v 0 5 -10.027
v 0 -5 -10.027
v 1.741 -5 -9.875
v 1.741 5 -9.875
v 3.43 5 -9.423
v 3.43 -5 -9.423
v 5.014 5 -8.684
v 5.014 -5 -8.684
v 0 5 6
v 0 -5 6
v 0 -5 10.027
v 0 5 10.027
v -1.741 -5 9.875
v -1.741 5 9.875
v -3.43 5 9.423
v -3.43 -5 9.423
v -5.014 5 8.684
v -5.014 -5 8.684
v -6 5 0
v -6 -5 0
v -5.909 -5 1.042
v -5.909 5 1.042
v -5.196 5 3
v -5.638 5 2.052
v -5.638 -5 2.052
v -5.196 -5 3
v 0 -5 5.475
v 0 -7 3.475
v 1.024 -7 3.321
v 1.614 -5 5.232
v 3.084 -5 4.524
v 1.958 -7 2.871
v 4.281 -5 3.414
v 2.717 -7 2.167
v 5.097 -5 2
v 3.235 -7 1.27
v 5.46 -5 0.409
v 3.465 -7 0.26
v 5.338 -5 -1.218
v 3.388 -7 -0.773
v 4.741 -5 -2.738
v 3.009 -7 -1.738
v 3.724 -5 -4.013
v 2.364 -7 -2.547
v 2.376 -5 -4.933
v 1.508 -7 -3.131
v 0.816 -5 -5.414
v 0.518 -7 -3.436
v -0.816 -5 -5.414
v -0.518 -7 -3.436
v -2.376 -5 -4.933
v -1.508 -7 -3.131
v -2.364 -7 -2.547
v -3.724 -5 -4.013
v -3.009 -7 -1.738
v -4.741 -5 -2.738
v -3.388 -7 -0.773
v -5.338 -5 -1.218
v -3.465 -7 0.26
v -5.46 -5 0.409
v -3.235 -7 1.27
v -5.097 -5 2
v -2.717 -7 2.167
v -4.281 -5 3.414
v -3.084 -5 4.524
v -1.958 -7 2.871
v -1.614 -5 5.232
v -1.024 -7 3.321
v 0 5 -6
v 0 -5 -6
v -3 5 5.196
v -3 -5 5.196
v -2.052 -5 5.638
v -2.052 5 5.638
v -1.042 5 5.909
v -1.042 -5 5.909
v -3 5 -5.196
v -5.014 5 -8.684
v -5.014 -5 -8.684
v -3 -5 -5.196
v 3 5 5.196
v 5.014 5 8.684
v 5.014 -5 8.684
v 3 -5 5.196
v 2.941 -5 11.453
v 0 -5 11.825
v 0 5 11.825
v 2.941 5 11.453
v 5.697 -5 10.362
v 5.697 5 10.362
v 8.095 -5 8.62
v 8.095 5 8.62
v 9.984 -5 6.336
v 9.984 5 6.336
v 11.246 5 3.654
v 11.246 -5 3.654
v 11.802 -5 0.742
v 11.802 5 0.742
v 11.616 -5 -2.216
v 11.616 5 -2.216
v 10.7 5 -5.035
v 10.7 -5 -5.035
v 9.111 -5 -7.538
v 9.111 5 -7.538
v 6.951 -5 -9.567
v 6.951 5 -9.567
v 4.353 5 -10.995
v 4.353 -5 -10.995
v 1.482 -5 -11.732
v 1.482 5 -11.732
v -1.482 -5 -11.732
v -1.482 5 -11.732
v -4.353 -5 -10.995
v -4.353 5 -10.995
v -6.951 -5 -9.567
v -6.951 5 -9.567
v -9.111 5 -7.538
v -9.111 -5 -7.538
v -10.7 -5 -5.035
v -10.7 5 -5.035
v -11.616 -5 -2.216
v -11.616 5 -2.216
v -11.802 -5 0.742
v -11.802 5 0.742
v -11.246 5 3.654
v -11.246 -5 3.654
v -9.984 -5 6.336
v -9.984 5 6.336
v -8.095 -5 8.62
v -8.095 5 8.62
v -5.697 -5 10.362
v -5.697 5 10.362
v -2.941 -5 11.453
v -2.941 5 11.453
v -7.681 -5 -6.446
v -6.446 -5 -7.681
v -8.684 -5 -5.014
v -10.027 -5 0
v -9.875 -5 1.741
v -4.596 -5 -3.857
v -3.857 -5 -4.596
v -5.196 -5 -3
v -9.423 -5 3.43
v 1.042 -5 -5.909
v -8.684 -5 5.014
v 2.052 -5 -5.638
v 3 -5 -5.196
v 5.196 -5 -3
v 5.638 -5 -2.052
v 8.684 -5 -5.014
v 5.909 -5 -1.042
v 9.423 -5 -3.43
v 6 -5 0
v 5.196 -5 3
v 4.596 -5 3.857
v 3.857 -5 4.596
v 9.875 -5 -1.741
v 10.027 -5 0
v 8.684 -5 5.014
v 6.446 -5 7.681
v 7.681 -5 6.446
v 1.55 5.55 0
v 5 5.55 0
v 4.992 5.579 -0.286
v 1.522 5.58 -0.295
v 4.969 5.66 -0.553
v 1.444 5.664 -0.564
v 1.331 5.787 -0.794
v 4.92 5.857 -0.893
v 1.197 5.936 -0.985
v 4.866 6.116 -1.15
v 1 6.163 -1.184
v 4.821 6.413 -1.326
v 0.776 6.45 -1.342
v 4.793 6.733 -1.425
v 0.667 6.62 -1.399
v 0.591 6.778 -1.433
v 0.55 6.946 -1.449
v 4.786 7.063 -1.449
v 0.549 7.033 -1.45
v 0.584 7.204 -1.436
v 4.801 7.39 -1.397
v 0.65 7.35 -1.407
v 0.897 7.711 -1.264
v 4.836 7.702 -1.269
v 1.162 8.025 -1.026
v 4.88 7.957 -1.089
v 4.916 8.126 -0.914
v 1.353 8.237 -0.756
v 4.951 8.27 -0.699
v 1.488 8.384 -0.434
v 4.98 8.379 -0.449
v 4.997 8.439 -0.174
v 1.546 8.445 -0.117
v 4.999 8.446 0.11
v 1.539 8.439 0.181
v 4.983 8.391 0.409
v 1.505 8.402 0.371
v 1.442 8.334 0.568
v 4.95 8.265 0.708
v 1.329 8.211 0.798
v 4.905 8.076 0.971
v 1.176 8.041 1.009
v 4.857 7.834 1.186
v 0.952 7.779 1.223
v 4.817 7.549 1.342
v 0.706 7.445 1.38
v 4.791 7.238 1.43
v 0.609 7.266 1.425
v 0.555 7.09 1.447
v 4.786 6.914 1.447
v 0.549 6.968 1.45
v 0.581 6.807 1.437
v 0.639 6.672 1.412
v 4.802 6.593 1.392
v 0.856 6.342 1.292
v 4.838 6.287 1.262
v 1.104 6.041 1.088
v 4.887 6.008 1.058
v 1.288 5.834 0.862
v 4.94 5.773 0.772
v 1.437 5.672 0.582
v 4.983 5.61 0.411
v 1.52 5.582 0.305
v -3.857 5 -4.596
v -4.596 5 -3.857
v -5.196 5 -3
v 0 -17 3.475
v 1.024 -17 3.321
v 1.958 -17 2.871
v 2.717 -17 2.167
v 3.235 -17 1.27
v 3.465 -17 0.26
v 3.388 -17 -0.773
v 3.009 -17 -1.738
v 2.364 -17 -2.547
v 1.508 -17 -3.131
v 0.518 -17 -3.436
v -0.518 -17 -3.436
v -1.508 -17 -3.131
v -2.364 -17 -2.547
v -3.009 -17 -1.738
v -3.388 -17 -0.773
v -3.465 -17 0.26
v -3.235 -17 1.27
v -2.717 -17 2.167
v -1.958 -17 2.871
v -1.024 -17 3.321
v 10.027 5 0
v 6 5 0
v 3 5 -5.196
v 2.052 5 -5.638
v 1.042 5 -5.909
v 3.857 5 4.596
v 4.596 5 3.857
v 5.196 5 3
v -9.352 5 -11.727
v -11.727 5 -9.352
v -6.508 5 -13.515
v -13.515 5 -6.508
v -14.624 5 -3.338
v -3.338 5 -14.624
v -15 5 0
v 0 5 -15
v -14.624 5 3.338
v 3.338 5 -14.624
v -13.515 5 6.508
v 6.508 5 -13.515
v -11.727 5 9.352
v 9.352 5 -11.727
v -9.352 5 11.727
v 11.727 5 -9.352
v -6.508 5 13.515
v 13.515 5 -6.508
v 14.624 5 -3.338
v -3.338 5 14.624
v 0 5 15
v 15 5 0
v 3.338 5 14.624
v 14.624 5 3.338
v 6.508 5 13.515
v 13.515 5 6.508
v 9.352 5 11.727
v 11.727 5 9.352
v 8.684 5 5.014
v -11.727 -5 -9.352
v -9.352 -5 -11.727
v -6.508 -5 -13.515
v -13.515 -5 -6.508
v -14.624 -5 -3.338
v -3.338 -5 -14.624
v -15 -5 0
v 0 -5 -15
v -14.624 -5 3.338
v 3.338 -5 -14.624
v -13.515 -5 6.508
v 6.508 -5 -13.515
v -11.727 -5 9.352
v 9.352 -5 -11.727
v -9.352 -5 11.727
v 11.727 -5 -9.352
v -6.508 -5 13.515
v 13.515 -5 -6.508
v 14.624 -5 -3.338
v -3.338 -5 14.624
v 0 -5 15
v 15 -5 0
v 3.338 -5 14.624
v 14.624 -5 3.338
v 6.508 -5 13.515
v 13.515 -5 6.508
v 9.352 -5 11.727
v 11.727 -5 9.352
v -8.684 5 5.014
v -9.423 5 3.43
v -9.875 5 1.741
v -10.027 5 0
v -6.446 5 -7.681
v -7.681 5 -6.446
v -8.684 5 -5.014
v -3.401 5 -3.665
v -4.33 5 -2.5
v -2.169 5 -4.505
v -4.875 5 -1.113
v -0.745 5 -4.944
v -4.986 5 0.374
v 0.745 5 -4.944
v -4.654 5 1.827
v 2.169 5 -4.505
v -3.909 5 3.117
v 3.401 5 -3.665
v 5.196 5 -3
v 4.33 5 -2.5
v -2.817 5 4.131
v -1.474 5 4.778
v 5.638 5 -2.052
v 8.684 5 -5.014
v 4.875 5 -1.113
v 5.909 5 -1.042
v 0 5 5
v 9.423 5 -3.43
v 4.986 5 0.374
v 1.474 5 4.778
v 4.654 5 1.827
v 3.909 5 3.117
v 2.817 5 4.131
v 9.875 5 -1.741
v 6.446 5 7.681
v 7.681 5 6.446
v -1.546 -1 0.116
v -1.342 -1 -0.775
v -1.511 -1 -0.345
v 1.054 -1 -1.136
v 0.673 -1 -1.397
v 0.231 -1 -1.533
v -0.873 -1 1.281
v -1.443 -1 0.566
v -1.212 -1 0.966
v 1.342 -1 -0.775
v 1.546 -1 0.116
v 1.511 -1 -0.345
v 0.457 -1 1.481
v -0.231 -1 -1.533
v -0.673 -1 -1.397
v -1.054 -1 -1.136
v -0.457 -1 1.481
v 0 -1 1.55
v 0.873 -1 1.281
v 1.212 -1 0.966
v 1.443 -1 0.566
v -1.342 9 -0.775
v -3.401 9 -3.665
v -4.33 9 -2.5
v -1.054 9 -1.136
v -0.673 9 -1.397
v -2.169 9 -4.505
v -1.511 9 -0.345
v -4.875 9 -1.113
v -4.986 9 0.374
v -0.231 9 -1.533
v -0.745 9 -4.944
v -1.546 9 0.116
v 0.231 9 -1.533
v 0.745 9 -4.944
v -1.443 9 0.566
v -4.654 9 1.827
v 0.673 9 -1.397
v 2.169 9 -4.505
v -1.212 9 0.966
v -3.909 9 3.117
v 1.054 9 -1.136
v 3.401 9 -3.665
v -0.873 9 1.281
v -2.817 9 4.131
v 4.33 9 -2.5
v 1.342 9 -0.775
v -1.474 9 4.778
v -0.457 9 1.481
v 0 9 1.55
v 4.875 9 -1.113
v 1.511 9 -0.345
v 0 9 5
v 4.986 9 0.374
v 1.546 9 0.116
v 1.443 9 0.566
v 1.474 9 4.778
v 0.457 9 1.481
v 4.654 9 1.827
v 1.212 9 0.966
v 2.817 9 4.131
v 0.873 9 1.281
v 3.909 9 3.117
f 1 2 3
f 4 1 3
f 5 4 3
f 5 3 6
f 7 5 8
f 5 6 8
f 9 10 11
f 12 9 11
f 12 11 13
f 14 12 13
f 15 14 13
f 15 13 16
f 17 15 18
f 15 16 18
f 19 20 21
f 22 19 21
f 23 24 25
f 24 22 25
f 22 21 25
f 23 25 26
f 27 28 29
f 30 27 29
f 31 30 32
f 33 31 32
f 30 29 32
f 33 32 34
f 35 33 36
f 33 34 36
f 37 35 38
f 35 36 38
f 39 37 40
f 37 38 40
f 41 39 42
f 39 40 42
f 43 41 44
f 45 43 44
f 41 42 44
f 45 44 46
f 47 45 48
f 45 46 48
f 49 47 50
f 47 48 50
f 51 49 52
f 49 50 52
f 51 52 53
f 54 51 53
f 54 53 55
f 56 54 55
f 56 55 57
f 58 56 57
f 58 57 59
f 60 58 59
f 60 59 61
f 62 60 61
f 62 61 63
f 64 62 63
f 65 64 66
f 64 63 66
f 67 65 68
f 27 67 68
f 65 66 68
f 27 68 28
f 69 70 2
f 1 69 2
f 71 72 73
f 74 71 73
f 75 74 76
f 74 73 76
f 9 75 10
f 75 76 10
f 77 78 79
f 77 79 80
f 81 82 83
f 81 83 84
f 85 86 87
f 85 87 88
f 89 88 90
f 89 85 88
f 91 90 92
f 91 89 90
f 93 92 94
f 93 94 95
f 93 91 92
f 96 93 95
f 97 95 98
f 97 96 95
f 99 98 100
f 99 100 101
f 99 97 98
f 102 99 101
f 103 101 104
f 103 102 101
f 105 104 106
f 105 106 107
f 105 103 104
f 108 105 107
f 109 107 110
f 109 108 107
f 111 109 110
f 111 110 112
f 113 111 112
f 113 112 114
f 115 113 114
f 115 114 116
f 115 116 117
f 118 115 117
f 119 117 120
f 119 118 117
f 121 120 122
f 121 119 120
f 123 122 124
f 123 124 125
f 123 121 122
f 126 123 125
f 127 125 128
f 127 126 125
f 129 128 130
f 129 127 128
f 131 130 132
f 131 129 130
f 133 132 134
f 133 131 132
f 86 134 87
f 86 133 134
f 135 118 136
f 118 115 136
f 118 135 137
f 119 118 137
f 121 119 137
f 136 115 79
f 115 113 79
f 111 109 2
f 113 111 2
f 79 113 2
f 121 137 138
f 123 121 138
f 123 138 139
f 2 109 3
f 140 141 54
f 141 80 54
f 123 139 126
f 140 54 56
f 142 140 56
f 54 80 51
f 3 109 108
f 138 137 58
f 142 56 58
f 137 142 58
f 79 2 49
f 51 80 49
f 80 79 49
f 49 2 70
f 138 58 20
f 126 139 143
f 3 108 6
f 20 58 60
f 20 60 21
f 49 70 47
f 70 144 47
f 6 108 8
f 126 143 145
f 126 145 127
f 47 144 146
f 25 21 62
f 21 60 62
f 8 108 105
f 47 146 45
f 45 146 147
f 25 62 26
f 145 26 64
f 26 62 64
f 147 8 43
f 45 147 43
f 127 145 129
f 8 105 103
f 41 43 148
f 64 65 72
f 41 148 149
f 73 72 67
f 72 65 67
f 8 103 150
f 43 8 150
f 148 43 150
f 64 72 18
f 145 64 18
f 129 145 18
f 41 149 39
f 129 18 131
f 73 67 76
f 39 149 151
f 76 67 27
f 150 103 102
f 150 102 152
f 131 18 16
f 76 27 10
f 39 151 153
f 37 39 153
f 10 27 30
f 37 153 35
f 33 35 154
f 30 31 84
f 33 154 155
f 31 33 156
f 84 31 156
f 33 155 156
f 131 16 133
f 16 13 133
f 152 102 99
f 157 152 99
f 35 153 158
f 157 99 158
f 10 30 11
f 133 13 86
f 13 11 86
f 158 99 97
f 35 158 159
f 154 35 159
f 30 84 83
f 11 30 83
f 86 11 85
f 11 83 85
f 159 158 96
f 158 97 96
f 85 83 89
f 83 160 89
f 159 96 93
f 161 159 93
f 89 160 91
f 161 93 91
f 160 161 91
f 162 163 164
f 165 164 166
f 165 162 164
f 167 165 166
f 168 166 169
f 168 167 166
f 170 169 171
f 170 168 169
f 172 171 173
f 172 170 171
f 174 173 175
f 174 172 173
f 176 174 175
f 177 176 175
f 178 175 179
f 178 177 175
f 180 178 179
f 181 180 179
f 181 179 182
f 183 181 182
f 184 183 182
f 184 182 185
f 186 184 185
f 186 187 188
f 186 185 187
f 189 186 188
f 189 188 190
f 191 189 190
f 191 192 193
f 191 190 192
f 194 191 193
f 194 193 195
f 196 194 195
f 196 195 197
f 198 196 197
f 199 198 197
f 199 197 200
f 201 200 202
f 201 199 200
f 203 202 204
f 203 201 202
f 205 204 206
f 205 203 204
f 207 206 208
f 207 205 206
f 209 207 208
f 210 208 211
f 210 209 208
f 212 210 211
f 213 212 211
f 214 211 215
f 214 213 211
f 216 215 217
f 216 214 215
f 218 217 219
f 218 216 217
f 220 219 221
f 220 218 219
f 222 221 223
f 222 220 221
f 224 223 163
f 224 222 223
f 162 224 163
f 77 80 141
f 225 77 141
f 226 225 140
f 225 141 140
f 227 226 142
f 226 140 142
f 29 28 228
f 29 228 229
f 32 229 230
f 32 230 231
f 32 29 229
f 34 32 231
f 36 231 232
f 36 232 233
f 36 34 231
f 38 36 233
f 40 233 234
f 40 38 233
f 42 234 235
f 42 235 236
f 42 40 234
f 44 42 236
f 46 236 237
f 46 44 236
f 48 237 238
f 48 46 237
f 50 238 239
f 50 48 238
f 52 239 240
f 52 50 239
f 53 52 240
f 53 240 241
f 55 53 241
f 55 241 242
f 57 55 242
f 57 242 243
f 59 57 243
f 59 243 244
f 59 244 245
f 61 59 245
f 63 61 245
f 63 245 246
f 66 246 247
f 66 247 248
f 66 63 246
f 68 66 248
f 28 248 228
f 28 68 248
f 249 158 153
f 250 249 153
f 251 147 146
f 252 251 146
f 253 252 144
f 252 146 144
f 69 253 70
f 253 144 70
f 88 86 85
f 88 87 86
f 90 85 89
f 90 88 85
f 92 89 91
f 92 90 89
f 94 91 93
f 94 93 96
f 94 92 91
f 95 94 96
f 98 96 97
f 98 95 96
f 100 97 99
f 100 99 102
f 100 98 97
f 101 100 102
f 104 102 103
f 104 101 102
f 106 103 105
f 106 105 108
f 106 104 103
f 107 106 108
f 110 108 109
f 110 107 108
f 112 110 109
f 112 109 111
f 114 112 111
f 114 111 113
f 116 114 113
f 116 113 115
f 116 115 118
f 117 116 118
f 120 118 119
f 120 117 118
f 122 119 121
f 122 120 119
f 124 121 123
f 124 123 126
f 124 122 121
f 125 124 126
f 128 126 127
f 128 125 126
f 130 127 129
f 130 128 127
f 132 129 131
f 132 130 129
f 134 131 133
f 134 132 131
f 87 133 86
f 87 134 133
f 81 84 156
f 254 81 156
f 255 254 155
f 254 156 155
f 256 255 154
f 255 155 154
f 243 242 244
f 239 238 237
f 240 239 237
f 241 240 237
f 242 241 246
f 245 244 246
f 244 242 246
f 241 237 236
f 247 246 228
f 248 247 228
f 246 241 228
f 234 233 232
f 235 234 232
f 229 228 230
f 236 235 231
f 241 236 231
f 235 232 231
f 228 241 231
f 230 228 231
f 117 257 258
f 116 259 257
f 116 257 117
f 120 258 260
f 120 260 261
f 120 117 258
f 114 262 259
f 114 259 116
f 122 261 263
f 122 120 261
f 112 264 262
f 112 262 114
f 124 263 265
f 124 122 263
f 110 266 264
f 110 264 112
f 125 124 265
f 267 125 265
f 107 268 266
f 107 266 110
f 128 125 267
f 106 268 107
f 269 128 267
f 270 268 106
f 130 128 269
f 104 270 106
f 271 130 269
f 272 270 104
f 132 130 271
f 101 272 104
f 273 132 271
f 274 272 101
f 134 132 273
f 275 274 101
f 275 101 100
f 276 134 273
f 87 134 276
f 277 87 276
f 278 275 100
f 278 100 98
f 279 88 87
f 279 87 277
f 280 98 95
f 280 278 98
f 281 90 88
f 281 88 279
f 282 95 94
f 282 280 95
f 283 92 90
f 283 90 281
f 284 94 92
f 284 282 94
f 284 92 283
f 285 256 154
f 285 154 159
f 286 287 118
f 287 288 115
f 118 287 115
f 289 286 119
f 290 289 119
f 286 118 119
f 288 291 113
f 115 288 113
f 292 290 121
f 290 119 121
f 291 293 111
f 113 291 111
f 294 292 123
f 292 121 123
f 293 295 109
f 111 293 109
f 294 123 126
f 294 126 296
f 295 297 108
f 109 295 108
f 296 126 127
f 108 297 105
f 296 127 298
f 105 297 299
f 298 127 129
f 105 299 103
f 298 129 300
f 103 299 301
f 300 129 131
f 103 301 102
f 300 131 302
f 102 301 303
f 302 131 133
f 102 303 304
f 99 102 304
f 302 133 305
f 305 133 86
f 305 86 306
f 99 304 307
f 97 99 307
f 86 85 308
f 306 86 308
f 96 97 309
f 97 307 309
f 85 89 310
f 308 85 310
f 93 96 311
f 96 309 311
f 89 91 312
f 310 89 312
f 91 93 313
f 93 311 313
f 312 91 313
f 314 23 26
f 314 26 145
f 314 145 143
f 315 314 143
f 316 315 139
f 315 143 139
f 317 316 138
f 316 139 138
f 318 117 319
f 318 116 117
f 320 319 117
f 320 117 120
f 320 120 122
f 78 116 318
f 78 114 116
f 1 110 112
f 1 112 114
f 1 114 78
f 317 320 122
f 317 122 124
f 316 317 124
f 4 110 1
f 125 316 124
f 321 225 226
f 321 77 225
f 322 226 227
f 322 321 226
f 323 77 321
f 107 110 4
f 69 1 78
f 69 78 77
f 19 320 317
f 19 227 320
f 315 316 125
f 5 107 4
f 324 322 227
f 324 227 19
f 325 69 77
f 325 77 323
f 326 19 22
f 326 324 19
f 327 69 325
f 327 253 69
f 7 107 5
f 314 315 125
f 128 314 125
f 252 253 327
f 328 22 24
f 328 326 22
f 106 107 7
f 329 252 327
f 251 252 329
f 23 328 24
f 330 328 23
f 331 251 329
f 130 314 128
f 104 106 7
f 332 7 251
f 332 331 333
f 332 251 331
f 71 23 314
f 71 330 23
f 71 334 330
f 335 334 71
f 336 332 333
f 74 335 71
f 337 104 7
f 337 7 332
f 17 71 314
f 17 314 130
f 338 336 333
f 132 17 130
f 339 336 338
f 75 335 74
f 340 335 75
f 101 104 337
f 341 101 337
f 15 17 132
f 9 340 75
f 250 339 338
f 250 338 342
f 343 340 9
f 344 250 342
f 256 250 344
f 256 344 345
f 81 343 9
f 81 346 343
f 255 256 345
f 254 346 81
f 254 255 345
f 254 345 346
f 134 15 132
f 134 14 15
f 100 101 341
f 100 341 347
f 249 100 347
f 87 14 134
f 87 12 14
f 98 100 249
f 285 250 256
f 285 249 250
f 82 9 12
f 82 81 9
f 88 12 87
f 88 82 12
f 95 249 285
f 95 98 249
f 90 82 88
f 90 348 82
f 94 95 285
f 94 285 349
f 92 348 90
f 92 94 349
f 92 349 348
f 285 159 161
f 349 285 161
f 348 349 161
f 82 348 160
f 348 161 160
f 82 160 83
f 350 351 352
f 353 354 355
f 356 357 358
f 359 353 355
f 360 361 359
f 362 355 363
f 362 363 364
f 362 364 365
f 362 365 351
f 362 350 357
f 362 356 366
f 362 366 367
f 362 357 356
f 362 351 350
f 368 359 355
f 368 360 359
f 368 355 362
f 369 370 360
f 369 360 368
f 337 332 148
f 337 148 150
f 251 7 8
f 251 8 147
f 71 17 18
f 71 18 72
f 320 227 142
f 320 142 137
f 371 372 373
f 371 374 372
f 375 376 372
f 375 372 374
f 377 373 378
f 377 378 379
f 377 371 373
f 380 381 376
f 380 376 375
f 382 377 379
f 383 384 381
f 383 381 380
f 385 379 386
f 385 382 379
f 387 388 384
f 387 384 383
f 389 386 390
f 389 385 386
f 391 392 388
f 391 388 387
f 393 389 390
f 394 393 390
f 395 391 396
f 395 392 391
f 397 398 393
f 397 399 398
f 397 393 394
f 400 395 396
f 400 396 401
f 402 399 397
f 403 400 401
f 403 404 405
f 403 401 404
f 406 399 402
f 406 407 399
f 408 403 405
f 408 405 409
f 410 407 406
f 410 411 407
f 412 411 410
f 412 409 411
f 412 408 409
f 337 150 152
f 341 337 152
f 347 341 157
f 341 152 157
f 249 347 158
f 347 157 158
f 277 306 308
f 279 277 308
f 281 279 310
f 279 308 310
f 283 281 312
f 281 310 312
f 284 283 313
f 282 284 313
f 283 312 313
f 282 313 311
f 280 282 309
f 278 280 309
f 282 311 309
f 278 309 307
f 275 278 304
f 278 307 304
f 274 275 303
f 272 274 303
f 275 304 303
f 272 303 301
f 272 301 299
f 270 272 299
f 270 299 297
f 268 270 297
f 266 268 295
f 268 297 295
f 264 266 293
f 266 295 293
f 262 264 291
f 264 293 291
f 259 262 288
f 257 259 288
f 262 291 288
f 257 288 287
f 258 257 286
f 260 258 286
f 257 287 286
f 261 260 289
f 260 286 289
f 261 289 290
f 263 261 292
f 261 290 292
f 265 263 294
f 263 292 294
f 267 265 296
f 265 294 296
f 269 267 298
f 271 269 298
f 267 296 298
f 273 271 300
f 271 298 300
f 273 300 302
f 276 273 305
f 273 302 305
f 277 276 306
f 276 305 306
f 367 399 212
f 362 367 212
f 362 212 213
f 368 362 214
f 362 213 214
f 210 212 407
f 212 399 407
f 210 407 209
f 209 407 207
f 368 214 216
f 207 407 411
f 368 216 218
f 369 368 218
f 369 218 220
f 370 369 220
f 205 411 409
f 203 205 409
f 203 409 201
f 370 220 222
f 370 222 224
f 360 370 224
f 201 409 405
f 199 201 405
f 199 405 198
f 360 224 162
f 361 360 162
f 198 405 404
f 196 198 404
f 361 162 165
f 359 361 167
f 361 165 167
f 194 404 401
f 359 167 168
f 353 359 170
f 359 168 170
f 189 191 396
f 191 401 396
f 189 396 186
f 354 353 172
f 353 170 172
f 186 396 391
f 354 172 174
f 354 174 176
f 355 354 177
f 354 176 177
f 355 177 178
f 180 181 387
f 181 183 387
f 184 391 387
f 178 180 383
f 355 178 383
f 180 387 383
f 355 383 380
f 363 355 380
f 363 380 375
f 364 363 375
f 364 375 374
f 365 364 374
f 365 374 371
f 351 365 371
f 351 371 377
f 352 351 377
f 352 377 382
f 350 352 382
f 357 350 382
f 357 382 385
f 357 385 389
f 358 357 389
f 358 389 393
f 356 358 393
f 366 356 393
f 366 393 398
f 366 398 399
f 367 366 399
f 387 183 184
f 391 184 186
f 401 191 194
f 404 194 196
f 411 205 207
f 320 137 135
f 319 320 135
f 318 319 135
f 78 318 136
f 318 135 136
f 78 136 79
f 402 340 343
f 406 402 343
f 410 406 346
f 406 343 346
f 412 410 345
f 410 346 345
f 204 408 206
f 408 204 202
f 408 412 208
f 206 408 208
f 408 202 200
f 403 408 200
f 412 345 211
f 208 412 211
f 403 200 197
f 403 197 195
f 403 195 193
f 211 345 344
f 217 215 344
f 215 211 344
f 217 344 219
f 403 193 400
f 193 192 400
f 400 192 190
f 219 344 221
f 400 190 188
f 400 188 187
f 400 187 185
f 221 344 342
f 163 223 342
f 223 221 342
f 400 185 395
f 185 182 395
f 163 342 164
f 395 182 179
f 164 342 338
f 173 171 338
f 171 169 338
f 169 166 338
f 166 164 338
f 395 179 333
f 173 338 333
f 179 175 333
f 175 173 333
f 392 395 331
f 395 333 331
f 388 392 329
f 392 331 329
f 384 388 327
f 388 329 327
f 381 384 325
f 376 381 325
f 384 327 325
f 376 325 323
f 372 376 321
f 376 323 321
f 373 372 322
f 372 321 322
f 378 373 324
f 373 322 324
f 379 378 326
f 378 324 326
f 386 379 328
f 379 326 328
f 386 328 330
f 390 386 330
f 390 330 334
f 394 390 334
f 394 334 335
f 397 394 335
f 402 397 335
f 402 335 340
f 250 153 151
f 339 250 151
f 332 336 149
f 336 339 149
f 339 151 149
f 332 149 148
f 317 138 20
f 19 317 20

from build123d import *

# Parameters (mm, degrees)
SKETCH1_R               = 11.825
BOSS_EXTRUDE1_DEPTH     = 5
BOSS_EXTRUDE2_START     = 5
SKETCH2_R               = 5
BOSS_EXTRUDE2_DEPTH     = 4
SKETCH3_R               = 1.45
CUT_EXTRUDE1_DEPTH      = 5
CUT_EXTRUDE2_START      = 9
SKETCH4_R               = 1.55
CUT_EXTRUDE2_DEPTH      = 10
CUT_EXTRUDE3_DEPTH      = 19.991083481
CUT_EXTRUDE3_DEPTH_BACK = 19.991083481
BOSS_EXTRUDE4_START     = -5
SKETCH8_R               = 3.475
BOSS_EXTRUDE4_DEPTH     = 12
CHAMFER1_SIZE           = 2
BOSS_EXTRUDE5_START     = -5
SKETCH9_R               = 15
SKETCH9_R_2             = 11.825
BOSS_EXTRUDE5_DEPTH     = 10


with BuildPart() as part:
    # Sketch1 → Boss-Extrude1 (new, symmetric)
    with BuildSketch(Plane(origin=(0, 0, 0), x_dir=(1, 0, 0), z_dir=(0, 1, 0))):
        with Locations(Location((0, 0, 0), (0, 0, 270))):
            Circle(SKETCH1_R)
    extrude(amount=BOSS_EXTRUDE1_DEPTH, both=True)

    # Sketch2 → Boss-Extrude2 (add)
    with BuildSketch(Plane(origin=(0, 0, 0), x_dir=(1, 0, 0), z_dir=(0, 1, 0)).offset(BOSS_EXTRUDE2_START)):
        with Locations(Location((0, 0, 0), (0, 0, 270))):
            Circle(SKETCH2_R)
    extrude(amount=BOSS_EXTRUDE2_DEPTH)

    # Sketch3 → Cut-Extrude1 (cut)
    with BuildSketch(Plane(origin=(0, 0, 0), x_dir=(0, 0, -1), z_dir=(1, 0, 0))):
        with Locations(Location((0, 7, 0), (0, 0, 270))):
            Circle(SKETCH3_R)
    extrude(amount=CUT_EXTRUDE1_DEPTH, mode=Mode.SUBTRACT)

    # Sketch4 → Cut-Extrude2 (cut)
    with BuildSketch(Plane(origin=(0, 0, 0), x_dir=(1, 0, 0), z_dir=(0, 1, 0)).offset(CUT_EXTRUDE2_START)):
        with Locations(Location((0, 0, 0), (0, 0, 270))):
            Circle(SKETCH4_R)
    extrude(amount=-CUT_EXTRUDE2_DEPTH, mode=Mode.SUBTRACT)

    # Sketch6 → Cut-Extrude3 (cut, two sides: drawn at the far end of the back side and taken through both)
    with BuildSketch(Plane(origin=(0, 0, 0), x_dir=(1, 0, 0), z_dir=(0, 1, 0)).offset(-CUT_EXTRUDE3_DEPTH_BACK)):
        with BuildLine():
            Line((0, 6), (0, 10.027433571))
            ThreePointArc((0, 10.027433571), (2.595290782, 9.685757057), (5.013716785, 8.684012207))
            Line((5.013716785, 8.684012207), (3, 5.196152423))
            ThreePointArc((3, 5.196152423), (1.552914271, 5.795554958), (0, 6))
        make_face()
        with BuildLine():
            Line((5.196152423, 3), (8.684012207, 5.013716785))
            ThreePointArc((8.684012207, 5.013716785), (9.685757057, 2.595290782), (10.027433571, 0))
            Line((10.027433571, 0), (6, 0))
            ThreePointArc((6, 0), (5.795554958, 1.552914271), (5.196152423, 3))
        make_face()
        with BuildLine():
            Line((5.196152423, -3), (8.684012207, -5.013716785))
            ThreePointArc((8.684012207, -5.013716785), (7.090466276, -7.090466276), (5.013716785, -8.684012207))
            Line((5.013716785, -8.684012207), (3, -5.196152423))
            ThreePointArc((3, -5.196152423), (4.242640687, -4.242640687), (5.196152423, -3))
        make_face()
        with BuildLine():
            Line((0, -6), (0, -10.027433571))
            ThreePointArc((0, -10.027433571), (-2.595290782, -9.685757057), (-5.013716785, -8.684012207))
            Line((-5.013716785, -8.684012207), (-3, -5.196152423))
            ThreePointArc((-3, -5.196152423), (-1.552914271, -5.795554958), (0, -6))
        make_face()
        with BuildLine():
            Line((-5.196152423, -3), (-8.684012207, -5.013716785))
            ThreePointArc((-8.684012207, -5.013716785), (-9.685757057, -2.595290782), (-10.027433571, 0))
            Line((-10.027433571, 0), (-6, 0))
            ThreePointArc((-6, 0), (-5.795554958, -1.552914271), (-5.196152423, -3))
        make_face()
        with BuildLine():
            Line((-5.196152423, 3), (-8.684012207, 5.013716785))
            ThreePointArc((-8.684012207, 5.013716785), (-7.090466276, 7.090466276), (-5.013716785, 8.684012207))
            Line((-5.013716785, 8.684012207), (-3, 5.196152423))
            ThreePointArc((-3, 5.196152423), (-4.242640687, 4.242640687), (-5.196152423, 3))
        make_face()
    extrude(amount=CUT_EXTRUDE3_DEPTH + CUT_EXTRUDE3_DEPTH_BACK, mode=Mode.SUBTRACT)

    # Sketch8 → Boss-Extrude4 (add)
    with BuildSketch(Plane(origin=(0, 0, 0), x_dir=(1, 0, 0), z_dir=(0, 1, 0)).offset(BOSS_EXTRUDE4_START)):
        with Locations(Location((0, 0, 0), (0, 0, 270))):
            Circle(SKETCH8_R)
    extrude(amount=-BOSS_EXTRUDE4_DEPTH)

    # Chamfer1
    chamfer1_edges = [part.edges().sort_by_distance(p)[0] for p in [
        (0, -5, -3.475),
    ]]
    chamfer(chamfer1_edges, length=CHAMFER1_SIZE)


with BuildPart() as body_2:
    # Sketch9 → Boss-Extrude5 (new body)
    with BuildSketch(Plane(origin=(0, 0, 0), x_dir=(1, 0, 0), z_dir=(0, 1, 0)).offset(BOSS_EXTRUDE5_START)):
        with Locations(Location((0, 0, 0), (0, 0, 270))):
            Circle(SKETCH9_R)
        with Locations(Location((0, 0, 0), (0, 0, 270))):
            Circle(SKETCH9_R_2, mode=Mode.SUBTRACT)
    extrude(amount=BOSS_EXTRUDE5_DEPTH)


solid = Compound([part.part, body_2.part])
